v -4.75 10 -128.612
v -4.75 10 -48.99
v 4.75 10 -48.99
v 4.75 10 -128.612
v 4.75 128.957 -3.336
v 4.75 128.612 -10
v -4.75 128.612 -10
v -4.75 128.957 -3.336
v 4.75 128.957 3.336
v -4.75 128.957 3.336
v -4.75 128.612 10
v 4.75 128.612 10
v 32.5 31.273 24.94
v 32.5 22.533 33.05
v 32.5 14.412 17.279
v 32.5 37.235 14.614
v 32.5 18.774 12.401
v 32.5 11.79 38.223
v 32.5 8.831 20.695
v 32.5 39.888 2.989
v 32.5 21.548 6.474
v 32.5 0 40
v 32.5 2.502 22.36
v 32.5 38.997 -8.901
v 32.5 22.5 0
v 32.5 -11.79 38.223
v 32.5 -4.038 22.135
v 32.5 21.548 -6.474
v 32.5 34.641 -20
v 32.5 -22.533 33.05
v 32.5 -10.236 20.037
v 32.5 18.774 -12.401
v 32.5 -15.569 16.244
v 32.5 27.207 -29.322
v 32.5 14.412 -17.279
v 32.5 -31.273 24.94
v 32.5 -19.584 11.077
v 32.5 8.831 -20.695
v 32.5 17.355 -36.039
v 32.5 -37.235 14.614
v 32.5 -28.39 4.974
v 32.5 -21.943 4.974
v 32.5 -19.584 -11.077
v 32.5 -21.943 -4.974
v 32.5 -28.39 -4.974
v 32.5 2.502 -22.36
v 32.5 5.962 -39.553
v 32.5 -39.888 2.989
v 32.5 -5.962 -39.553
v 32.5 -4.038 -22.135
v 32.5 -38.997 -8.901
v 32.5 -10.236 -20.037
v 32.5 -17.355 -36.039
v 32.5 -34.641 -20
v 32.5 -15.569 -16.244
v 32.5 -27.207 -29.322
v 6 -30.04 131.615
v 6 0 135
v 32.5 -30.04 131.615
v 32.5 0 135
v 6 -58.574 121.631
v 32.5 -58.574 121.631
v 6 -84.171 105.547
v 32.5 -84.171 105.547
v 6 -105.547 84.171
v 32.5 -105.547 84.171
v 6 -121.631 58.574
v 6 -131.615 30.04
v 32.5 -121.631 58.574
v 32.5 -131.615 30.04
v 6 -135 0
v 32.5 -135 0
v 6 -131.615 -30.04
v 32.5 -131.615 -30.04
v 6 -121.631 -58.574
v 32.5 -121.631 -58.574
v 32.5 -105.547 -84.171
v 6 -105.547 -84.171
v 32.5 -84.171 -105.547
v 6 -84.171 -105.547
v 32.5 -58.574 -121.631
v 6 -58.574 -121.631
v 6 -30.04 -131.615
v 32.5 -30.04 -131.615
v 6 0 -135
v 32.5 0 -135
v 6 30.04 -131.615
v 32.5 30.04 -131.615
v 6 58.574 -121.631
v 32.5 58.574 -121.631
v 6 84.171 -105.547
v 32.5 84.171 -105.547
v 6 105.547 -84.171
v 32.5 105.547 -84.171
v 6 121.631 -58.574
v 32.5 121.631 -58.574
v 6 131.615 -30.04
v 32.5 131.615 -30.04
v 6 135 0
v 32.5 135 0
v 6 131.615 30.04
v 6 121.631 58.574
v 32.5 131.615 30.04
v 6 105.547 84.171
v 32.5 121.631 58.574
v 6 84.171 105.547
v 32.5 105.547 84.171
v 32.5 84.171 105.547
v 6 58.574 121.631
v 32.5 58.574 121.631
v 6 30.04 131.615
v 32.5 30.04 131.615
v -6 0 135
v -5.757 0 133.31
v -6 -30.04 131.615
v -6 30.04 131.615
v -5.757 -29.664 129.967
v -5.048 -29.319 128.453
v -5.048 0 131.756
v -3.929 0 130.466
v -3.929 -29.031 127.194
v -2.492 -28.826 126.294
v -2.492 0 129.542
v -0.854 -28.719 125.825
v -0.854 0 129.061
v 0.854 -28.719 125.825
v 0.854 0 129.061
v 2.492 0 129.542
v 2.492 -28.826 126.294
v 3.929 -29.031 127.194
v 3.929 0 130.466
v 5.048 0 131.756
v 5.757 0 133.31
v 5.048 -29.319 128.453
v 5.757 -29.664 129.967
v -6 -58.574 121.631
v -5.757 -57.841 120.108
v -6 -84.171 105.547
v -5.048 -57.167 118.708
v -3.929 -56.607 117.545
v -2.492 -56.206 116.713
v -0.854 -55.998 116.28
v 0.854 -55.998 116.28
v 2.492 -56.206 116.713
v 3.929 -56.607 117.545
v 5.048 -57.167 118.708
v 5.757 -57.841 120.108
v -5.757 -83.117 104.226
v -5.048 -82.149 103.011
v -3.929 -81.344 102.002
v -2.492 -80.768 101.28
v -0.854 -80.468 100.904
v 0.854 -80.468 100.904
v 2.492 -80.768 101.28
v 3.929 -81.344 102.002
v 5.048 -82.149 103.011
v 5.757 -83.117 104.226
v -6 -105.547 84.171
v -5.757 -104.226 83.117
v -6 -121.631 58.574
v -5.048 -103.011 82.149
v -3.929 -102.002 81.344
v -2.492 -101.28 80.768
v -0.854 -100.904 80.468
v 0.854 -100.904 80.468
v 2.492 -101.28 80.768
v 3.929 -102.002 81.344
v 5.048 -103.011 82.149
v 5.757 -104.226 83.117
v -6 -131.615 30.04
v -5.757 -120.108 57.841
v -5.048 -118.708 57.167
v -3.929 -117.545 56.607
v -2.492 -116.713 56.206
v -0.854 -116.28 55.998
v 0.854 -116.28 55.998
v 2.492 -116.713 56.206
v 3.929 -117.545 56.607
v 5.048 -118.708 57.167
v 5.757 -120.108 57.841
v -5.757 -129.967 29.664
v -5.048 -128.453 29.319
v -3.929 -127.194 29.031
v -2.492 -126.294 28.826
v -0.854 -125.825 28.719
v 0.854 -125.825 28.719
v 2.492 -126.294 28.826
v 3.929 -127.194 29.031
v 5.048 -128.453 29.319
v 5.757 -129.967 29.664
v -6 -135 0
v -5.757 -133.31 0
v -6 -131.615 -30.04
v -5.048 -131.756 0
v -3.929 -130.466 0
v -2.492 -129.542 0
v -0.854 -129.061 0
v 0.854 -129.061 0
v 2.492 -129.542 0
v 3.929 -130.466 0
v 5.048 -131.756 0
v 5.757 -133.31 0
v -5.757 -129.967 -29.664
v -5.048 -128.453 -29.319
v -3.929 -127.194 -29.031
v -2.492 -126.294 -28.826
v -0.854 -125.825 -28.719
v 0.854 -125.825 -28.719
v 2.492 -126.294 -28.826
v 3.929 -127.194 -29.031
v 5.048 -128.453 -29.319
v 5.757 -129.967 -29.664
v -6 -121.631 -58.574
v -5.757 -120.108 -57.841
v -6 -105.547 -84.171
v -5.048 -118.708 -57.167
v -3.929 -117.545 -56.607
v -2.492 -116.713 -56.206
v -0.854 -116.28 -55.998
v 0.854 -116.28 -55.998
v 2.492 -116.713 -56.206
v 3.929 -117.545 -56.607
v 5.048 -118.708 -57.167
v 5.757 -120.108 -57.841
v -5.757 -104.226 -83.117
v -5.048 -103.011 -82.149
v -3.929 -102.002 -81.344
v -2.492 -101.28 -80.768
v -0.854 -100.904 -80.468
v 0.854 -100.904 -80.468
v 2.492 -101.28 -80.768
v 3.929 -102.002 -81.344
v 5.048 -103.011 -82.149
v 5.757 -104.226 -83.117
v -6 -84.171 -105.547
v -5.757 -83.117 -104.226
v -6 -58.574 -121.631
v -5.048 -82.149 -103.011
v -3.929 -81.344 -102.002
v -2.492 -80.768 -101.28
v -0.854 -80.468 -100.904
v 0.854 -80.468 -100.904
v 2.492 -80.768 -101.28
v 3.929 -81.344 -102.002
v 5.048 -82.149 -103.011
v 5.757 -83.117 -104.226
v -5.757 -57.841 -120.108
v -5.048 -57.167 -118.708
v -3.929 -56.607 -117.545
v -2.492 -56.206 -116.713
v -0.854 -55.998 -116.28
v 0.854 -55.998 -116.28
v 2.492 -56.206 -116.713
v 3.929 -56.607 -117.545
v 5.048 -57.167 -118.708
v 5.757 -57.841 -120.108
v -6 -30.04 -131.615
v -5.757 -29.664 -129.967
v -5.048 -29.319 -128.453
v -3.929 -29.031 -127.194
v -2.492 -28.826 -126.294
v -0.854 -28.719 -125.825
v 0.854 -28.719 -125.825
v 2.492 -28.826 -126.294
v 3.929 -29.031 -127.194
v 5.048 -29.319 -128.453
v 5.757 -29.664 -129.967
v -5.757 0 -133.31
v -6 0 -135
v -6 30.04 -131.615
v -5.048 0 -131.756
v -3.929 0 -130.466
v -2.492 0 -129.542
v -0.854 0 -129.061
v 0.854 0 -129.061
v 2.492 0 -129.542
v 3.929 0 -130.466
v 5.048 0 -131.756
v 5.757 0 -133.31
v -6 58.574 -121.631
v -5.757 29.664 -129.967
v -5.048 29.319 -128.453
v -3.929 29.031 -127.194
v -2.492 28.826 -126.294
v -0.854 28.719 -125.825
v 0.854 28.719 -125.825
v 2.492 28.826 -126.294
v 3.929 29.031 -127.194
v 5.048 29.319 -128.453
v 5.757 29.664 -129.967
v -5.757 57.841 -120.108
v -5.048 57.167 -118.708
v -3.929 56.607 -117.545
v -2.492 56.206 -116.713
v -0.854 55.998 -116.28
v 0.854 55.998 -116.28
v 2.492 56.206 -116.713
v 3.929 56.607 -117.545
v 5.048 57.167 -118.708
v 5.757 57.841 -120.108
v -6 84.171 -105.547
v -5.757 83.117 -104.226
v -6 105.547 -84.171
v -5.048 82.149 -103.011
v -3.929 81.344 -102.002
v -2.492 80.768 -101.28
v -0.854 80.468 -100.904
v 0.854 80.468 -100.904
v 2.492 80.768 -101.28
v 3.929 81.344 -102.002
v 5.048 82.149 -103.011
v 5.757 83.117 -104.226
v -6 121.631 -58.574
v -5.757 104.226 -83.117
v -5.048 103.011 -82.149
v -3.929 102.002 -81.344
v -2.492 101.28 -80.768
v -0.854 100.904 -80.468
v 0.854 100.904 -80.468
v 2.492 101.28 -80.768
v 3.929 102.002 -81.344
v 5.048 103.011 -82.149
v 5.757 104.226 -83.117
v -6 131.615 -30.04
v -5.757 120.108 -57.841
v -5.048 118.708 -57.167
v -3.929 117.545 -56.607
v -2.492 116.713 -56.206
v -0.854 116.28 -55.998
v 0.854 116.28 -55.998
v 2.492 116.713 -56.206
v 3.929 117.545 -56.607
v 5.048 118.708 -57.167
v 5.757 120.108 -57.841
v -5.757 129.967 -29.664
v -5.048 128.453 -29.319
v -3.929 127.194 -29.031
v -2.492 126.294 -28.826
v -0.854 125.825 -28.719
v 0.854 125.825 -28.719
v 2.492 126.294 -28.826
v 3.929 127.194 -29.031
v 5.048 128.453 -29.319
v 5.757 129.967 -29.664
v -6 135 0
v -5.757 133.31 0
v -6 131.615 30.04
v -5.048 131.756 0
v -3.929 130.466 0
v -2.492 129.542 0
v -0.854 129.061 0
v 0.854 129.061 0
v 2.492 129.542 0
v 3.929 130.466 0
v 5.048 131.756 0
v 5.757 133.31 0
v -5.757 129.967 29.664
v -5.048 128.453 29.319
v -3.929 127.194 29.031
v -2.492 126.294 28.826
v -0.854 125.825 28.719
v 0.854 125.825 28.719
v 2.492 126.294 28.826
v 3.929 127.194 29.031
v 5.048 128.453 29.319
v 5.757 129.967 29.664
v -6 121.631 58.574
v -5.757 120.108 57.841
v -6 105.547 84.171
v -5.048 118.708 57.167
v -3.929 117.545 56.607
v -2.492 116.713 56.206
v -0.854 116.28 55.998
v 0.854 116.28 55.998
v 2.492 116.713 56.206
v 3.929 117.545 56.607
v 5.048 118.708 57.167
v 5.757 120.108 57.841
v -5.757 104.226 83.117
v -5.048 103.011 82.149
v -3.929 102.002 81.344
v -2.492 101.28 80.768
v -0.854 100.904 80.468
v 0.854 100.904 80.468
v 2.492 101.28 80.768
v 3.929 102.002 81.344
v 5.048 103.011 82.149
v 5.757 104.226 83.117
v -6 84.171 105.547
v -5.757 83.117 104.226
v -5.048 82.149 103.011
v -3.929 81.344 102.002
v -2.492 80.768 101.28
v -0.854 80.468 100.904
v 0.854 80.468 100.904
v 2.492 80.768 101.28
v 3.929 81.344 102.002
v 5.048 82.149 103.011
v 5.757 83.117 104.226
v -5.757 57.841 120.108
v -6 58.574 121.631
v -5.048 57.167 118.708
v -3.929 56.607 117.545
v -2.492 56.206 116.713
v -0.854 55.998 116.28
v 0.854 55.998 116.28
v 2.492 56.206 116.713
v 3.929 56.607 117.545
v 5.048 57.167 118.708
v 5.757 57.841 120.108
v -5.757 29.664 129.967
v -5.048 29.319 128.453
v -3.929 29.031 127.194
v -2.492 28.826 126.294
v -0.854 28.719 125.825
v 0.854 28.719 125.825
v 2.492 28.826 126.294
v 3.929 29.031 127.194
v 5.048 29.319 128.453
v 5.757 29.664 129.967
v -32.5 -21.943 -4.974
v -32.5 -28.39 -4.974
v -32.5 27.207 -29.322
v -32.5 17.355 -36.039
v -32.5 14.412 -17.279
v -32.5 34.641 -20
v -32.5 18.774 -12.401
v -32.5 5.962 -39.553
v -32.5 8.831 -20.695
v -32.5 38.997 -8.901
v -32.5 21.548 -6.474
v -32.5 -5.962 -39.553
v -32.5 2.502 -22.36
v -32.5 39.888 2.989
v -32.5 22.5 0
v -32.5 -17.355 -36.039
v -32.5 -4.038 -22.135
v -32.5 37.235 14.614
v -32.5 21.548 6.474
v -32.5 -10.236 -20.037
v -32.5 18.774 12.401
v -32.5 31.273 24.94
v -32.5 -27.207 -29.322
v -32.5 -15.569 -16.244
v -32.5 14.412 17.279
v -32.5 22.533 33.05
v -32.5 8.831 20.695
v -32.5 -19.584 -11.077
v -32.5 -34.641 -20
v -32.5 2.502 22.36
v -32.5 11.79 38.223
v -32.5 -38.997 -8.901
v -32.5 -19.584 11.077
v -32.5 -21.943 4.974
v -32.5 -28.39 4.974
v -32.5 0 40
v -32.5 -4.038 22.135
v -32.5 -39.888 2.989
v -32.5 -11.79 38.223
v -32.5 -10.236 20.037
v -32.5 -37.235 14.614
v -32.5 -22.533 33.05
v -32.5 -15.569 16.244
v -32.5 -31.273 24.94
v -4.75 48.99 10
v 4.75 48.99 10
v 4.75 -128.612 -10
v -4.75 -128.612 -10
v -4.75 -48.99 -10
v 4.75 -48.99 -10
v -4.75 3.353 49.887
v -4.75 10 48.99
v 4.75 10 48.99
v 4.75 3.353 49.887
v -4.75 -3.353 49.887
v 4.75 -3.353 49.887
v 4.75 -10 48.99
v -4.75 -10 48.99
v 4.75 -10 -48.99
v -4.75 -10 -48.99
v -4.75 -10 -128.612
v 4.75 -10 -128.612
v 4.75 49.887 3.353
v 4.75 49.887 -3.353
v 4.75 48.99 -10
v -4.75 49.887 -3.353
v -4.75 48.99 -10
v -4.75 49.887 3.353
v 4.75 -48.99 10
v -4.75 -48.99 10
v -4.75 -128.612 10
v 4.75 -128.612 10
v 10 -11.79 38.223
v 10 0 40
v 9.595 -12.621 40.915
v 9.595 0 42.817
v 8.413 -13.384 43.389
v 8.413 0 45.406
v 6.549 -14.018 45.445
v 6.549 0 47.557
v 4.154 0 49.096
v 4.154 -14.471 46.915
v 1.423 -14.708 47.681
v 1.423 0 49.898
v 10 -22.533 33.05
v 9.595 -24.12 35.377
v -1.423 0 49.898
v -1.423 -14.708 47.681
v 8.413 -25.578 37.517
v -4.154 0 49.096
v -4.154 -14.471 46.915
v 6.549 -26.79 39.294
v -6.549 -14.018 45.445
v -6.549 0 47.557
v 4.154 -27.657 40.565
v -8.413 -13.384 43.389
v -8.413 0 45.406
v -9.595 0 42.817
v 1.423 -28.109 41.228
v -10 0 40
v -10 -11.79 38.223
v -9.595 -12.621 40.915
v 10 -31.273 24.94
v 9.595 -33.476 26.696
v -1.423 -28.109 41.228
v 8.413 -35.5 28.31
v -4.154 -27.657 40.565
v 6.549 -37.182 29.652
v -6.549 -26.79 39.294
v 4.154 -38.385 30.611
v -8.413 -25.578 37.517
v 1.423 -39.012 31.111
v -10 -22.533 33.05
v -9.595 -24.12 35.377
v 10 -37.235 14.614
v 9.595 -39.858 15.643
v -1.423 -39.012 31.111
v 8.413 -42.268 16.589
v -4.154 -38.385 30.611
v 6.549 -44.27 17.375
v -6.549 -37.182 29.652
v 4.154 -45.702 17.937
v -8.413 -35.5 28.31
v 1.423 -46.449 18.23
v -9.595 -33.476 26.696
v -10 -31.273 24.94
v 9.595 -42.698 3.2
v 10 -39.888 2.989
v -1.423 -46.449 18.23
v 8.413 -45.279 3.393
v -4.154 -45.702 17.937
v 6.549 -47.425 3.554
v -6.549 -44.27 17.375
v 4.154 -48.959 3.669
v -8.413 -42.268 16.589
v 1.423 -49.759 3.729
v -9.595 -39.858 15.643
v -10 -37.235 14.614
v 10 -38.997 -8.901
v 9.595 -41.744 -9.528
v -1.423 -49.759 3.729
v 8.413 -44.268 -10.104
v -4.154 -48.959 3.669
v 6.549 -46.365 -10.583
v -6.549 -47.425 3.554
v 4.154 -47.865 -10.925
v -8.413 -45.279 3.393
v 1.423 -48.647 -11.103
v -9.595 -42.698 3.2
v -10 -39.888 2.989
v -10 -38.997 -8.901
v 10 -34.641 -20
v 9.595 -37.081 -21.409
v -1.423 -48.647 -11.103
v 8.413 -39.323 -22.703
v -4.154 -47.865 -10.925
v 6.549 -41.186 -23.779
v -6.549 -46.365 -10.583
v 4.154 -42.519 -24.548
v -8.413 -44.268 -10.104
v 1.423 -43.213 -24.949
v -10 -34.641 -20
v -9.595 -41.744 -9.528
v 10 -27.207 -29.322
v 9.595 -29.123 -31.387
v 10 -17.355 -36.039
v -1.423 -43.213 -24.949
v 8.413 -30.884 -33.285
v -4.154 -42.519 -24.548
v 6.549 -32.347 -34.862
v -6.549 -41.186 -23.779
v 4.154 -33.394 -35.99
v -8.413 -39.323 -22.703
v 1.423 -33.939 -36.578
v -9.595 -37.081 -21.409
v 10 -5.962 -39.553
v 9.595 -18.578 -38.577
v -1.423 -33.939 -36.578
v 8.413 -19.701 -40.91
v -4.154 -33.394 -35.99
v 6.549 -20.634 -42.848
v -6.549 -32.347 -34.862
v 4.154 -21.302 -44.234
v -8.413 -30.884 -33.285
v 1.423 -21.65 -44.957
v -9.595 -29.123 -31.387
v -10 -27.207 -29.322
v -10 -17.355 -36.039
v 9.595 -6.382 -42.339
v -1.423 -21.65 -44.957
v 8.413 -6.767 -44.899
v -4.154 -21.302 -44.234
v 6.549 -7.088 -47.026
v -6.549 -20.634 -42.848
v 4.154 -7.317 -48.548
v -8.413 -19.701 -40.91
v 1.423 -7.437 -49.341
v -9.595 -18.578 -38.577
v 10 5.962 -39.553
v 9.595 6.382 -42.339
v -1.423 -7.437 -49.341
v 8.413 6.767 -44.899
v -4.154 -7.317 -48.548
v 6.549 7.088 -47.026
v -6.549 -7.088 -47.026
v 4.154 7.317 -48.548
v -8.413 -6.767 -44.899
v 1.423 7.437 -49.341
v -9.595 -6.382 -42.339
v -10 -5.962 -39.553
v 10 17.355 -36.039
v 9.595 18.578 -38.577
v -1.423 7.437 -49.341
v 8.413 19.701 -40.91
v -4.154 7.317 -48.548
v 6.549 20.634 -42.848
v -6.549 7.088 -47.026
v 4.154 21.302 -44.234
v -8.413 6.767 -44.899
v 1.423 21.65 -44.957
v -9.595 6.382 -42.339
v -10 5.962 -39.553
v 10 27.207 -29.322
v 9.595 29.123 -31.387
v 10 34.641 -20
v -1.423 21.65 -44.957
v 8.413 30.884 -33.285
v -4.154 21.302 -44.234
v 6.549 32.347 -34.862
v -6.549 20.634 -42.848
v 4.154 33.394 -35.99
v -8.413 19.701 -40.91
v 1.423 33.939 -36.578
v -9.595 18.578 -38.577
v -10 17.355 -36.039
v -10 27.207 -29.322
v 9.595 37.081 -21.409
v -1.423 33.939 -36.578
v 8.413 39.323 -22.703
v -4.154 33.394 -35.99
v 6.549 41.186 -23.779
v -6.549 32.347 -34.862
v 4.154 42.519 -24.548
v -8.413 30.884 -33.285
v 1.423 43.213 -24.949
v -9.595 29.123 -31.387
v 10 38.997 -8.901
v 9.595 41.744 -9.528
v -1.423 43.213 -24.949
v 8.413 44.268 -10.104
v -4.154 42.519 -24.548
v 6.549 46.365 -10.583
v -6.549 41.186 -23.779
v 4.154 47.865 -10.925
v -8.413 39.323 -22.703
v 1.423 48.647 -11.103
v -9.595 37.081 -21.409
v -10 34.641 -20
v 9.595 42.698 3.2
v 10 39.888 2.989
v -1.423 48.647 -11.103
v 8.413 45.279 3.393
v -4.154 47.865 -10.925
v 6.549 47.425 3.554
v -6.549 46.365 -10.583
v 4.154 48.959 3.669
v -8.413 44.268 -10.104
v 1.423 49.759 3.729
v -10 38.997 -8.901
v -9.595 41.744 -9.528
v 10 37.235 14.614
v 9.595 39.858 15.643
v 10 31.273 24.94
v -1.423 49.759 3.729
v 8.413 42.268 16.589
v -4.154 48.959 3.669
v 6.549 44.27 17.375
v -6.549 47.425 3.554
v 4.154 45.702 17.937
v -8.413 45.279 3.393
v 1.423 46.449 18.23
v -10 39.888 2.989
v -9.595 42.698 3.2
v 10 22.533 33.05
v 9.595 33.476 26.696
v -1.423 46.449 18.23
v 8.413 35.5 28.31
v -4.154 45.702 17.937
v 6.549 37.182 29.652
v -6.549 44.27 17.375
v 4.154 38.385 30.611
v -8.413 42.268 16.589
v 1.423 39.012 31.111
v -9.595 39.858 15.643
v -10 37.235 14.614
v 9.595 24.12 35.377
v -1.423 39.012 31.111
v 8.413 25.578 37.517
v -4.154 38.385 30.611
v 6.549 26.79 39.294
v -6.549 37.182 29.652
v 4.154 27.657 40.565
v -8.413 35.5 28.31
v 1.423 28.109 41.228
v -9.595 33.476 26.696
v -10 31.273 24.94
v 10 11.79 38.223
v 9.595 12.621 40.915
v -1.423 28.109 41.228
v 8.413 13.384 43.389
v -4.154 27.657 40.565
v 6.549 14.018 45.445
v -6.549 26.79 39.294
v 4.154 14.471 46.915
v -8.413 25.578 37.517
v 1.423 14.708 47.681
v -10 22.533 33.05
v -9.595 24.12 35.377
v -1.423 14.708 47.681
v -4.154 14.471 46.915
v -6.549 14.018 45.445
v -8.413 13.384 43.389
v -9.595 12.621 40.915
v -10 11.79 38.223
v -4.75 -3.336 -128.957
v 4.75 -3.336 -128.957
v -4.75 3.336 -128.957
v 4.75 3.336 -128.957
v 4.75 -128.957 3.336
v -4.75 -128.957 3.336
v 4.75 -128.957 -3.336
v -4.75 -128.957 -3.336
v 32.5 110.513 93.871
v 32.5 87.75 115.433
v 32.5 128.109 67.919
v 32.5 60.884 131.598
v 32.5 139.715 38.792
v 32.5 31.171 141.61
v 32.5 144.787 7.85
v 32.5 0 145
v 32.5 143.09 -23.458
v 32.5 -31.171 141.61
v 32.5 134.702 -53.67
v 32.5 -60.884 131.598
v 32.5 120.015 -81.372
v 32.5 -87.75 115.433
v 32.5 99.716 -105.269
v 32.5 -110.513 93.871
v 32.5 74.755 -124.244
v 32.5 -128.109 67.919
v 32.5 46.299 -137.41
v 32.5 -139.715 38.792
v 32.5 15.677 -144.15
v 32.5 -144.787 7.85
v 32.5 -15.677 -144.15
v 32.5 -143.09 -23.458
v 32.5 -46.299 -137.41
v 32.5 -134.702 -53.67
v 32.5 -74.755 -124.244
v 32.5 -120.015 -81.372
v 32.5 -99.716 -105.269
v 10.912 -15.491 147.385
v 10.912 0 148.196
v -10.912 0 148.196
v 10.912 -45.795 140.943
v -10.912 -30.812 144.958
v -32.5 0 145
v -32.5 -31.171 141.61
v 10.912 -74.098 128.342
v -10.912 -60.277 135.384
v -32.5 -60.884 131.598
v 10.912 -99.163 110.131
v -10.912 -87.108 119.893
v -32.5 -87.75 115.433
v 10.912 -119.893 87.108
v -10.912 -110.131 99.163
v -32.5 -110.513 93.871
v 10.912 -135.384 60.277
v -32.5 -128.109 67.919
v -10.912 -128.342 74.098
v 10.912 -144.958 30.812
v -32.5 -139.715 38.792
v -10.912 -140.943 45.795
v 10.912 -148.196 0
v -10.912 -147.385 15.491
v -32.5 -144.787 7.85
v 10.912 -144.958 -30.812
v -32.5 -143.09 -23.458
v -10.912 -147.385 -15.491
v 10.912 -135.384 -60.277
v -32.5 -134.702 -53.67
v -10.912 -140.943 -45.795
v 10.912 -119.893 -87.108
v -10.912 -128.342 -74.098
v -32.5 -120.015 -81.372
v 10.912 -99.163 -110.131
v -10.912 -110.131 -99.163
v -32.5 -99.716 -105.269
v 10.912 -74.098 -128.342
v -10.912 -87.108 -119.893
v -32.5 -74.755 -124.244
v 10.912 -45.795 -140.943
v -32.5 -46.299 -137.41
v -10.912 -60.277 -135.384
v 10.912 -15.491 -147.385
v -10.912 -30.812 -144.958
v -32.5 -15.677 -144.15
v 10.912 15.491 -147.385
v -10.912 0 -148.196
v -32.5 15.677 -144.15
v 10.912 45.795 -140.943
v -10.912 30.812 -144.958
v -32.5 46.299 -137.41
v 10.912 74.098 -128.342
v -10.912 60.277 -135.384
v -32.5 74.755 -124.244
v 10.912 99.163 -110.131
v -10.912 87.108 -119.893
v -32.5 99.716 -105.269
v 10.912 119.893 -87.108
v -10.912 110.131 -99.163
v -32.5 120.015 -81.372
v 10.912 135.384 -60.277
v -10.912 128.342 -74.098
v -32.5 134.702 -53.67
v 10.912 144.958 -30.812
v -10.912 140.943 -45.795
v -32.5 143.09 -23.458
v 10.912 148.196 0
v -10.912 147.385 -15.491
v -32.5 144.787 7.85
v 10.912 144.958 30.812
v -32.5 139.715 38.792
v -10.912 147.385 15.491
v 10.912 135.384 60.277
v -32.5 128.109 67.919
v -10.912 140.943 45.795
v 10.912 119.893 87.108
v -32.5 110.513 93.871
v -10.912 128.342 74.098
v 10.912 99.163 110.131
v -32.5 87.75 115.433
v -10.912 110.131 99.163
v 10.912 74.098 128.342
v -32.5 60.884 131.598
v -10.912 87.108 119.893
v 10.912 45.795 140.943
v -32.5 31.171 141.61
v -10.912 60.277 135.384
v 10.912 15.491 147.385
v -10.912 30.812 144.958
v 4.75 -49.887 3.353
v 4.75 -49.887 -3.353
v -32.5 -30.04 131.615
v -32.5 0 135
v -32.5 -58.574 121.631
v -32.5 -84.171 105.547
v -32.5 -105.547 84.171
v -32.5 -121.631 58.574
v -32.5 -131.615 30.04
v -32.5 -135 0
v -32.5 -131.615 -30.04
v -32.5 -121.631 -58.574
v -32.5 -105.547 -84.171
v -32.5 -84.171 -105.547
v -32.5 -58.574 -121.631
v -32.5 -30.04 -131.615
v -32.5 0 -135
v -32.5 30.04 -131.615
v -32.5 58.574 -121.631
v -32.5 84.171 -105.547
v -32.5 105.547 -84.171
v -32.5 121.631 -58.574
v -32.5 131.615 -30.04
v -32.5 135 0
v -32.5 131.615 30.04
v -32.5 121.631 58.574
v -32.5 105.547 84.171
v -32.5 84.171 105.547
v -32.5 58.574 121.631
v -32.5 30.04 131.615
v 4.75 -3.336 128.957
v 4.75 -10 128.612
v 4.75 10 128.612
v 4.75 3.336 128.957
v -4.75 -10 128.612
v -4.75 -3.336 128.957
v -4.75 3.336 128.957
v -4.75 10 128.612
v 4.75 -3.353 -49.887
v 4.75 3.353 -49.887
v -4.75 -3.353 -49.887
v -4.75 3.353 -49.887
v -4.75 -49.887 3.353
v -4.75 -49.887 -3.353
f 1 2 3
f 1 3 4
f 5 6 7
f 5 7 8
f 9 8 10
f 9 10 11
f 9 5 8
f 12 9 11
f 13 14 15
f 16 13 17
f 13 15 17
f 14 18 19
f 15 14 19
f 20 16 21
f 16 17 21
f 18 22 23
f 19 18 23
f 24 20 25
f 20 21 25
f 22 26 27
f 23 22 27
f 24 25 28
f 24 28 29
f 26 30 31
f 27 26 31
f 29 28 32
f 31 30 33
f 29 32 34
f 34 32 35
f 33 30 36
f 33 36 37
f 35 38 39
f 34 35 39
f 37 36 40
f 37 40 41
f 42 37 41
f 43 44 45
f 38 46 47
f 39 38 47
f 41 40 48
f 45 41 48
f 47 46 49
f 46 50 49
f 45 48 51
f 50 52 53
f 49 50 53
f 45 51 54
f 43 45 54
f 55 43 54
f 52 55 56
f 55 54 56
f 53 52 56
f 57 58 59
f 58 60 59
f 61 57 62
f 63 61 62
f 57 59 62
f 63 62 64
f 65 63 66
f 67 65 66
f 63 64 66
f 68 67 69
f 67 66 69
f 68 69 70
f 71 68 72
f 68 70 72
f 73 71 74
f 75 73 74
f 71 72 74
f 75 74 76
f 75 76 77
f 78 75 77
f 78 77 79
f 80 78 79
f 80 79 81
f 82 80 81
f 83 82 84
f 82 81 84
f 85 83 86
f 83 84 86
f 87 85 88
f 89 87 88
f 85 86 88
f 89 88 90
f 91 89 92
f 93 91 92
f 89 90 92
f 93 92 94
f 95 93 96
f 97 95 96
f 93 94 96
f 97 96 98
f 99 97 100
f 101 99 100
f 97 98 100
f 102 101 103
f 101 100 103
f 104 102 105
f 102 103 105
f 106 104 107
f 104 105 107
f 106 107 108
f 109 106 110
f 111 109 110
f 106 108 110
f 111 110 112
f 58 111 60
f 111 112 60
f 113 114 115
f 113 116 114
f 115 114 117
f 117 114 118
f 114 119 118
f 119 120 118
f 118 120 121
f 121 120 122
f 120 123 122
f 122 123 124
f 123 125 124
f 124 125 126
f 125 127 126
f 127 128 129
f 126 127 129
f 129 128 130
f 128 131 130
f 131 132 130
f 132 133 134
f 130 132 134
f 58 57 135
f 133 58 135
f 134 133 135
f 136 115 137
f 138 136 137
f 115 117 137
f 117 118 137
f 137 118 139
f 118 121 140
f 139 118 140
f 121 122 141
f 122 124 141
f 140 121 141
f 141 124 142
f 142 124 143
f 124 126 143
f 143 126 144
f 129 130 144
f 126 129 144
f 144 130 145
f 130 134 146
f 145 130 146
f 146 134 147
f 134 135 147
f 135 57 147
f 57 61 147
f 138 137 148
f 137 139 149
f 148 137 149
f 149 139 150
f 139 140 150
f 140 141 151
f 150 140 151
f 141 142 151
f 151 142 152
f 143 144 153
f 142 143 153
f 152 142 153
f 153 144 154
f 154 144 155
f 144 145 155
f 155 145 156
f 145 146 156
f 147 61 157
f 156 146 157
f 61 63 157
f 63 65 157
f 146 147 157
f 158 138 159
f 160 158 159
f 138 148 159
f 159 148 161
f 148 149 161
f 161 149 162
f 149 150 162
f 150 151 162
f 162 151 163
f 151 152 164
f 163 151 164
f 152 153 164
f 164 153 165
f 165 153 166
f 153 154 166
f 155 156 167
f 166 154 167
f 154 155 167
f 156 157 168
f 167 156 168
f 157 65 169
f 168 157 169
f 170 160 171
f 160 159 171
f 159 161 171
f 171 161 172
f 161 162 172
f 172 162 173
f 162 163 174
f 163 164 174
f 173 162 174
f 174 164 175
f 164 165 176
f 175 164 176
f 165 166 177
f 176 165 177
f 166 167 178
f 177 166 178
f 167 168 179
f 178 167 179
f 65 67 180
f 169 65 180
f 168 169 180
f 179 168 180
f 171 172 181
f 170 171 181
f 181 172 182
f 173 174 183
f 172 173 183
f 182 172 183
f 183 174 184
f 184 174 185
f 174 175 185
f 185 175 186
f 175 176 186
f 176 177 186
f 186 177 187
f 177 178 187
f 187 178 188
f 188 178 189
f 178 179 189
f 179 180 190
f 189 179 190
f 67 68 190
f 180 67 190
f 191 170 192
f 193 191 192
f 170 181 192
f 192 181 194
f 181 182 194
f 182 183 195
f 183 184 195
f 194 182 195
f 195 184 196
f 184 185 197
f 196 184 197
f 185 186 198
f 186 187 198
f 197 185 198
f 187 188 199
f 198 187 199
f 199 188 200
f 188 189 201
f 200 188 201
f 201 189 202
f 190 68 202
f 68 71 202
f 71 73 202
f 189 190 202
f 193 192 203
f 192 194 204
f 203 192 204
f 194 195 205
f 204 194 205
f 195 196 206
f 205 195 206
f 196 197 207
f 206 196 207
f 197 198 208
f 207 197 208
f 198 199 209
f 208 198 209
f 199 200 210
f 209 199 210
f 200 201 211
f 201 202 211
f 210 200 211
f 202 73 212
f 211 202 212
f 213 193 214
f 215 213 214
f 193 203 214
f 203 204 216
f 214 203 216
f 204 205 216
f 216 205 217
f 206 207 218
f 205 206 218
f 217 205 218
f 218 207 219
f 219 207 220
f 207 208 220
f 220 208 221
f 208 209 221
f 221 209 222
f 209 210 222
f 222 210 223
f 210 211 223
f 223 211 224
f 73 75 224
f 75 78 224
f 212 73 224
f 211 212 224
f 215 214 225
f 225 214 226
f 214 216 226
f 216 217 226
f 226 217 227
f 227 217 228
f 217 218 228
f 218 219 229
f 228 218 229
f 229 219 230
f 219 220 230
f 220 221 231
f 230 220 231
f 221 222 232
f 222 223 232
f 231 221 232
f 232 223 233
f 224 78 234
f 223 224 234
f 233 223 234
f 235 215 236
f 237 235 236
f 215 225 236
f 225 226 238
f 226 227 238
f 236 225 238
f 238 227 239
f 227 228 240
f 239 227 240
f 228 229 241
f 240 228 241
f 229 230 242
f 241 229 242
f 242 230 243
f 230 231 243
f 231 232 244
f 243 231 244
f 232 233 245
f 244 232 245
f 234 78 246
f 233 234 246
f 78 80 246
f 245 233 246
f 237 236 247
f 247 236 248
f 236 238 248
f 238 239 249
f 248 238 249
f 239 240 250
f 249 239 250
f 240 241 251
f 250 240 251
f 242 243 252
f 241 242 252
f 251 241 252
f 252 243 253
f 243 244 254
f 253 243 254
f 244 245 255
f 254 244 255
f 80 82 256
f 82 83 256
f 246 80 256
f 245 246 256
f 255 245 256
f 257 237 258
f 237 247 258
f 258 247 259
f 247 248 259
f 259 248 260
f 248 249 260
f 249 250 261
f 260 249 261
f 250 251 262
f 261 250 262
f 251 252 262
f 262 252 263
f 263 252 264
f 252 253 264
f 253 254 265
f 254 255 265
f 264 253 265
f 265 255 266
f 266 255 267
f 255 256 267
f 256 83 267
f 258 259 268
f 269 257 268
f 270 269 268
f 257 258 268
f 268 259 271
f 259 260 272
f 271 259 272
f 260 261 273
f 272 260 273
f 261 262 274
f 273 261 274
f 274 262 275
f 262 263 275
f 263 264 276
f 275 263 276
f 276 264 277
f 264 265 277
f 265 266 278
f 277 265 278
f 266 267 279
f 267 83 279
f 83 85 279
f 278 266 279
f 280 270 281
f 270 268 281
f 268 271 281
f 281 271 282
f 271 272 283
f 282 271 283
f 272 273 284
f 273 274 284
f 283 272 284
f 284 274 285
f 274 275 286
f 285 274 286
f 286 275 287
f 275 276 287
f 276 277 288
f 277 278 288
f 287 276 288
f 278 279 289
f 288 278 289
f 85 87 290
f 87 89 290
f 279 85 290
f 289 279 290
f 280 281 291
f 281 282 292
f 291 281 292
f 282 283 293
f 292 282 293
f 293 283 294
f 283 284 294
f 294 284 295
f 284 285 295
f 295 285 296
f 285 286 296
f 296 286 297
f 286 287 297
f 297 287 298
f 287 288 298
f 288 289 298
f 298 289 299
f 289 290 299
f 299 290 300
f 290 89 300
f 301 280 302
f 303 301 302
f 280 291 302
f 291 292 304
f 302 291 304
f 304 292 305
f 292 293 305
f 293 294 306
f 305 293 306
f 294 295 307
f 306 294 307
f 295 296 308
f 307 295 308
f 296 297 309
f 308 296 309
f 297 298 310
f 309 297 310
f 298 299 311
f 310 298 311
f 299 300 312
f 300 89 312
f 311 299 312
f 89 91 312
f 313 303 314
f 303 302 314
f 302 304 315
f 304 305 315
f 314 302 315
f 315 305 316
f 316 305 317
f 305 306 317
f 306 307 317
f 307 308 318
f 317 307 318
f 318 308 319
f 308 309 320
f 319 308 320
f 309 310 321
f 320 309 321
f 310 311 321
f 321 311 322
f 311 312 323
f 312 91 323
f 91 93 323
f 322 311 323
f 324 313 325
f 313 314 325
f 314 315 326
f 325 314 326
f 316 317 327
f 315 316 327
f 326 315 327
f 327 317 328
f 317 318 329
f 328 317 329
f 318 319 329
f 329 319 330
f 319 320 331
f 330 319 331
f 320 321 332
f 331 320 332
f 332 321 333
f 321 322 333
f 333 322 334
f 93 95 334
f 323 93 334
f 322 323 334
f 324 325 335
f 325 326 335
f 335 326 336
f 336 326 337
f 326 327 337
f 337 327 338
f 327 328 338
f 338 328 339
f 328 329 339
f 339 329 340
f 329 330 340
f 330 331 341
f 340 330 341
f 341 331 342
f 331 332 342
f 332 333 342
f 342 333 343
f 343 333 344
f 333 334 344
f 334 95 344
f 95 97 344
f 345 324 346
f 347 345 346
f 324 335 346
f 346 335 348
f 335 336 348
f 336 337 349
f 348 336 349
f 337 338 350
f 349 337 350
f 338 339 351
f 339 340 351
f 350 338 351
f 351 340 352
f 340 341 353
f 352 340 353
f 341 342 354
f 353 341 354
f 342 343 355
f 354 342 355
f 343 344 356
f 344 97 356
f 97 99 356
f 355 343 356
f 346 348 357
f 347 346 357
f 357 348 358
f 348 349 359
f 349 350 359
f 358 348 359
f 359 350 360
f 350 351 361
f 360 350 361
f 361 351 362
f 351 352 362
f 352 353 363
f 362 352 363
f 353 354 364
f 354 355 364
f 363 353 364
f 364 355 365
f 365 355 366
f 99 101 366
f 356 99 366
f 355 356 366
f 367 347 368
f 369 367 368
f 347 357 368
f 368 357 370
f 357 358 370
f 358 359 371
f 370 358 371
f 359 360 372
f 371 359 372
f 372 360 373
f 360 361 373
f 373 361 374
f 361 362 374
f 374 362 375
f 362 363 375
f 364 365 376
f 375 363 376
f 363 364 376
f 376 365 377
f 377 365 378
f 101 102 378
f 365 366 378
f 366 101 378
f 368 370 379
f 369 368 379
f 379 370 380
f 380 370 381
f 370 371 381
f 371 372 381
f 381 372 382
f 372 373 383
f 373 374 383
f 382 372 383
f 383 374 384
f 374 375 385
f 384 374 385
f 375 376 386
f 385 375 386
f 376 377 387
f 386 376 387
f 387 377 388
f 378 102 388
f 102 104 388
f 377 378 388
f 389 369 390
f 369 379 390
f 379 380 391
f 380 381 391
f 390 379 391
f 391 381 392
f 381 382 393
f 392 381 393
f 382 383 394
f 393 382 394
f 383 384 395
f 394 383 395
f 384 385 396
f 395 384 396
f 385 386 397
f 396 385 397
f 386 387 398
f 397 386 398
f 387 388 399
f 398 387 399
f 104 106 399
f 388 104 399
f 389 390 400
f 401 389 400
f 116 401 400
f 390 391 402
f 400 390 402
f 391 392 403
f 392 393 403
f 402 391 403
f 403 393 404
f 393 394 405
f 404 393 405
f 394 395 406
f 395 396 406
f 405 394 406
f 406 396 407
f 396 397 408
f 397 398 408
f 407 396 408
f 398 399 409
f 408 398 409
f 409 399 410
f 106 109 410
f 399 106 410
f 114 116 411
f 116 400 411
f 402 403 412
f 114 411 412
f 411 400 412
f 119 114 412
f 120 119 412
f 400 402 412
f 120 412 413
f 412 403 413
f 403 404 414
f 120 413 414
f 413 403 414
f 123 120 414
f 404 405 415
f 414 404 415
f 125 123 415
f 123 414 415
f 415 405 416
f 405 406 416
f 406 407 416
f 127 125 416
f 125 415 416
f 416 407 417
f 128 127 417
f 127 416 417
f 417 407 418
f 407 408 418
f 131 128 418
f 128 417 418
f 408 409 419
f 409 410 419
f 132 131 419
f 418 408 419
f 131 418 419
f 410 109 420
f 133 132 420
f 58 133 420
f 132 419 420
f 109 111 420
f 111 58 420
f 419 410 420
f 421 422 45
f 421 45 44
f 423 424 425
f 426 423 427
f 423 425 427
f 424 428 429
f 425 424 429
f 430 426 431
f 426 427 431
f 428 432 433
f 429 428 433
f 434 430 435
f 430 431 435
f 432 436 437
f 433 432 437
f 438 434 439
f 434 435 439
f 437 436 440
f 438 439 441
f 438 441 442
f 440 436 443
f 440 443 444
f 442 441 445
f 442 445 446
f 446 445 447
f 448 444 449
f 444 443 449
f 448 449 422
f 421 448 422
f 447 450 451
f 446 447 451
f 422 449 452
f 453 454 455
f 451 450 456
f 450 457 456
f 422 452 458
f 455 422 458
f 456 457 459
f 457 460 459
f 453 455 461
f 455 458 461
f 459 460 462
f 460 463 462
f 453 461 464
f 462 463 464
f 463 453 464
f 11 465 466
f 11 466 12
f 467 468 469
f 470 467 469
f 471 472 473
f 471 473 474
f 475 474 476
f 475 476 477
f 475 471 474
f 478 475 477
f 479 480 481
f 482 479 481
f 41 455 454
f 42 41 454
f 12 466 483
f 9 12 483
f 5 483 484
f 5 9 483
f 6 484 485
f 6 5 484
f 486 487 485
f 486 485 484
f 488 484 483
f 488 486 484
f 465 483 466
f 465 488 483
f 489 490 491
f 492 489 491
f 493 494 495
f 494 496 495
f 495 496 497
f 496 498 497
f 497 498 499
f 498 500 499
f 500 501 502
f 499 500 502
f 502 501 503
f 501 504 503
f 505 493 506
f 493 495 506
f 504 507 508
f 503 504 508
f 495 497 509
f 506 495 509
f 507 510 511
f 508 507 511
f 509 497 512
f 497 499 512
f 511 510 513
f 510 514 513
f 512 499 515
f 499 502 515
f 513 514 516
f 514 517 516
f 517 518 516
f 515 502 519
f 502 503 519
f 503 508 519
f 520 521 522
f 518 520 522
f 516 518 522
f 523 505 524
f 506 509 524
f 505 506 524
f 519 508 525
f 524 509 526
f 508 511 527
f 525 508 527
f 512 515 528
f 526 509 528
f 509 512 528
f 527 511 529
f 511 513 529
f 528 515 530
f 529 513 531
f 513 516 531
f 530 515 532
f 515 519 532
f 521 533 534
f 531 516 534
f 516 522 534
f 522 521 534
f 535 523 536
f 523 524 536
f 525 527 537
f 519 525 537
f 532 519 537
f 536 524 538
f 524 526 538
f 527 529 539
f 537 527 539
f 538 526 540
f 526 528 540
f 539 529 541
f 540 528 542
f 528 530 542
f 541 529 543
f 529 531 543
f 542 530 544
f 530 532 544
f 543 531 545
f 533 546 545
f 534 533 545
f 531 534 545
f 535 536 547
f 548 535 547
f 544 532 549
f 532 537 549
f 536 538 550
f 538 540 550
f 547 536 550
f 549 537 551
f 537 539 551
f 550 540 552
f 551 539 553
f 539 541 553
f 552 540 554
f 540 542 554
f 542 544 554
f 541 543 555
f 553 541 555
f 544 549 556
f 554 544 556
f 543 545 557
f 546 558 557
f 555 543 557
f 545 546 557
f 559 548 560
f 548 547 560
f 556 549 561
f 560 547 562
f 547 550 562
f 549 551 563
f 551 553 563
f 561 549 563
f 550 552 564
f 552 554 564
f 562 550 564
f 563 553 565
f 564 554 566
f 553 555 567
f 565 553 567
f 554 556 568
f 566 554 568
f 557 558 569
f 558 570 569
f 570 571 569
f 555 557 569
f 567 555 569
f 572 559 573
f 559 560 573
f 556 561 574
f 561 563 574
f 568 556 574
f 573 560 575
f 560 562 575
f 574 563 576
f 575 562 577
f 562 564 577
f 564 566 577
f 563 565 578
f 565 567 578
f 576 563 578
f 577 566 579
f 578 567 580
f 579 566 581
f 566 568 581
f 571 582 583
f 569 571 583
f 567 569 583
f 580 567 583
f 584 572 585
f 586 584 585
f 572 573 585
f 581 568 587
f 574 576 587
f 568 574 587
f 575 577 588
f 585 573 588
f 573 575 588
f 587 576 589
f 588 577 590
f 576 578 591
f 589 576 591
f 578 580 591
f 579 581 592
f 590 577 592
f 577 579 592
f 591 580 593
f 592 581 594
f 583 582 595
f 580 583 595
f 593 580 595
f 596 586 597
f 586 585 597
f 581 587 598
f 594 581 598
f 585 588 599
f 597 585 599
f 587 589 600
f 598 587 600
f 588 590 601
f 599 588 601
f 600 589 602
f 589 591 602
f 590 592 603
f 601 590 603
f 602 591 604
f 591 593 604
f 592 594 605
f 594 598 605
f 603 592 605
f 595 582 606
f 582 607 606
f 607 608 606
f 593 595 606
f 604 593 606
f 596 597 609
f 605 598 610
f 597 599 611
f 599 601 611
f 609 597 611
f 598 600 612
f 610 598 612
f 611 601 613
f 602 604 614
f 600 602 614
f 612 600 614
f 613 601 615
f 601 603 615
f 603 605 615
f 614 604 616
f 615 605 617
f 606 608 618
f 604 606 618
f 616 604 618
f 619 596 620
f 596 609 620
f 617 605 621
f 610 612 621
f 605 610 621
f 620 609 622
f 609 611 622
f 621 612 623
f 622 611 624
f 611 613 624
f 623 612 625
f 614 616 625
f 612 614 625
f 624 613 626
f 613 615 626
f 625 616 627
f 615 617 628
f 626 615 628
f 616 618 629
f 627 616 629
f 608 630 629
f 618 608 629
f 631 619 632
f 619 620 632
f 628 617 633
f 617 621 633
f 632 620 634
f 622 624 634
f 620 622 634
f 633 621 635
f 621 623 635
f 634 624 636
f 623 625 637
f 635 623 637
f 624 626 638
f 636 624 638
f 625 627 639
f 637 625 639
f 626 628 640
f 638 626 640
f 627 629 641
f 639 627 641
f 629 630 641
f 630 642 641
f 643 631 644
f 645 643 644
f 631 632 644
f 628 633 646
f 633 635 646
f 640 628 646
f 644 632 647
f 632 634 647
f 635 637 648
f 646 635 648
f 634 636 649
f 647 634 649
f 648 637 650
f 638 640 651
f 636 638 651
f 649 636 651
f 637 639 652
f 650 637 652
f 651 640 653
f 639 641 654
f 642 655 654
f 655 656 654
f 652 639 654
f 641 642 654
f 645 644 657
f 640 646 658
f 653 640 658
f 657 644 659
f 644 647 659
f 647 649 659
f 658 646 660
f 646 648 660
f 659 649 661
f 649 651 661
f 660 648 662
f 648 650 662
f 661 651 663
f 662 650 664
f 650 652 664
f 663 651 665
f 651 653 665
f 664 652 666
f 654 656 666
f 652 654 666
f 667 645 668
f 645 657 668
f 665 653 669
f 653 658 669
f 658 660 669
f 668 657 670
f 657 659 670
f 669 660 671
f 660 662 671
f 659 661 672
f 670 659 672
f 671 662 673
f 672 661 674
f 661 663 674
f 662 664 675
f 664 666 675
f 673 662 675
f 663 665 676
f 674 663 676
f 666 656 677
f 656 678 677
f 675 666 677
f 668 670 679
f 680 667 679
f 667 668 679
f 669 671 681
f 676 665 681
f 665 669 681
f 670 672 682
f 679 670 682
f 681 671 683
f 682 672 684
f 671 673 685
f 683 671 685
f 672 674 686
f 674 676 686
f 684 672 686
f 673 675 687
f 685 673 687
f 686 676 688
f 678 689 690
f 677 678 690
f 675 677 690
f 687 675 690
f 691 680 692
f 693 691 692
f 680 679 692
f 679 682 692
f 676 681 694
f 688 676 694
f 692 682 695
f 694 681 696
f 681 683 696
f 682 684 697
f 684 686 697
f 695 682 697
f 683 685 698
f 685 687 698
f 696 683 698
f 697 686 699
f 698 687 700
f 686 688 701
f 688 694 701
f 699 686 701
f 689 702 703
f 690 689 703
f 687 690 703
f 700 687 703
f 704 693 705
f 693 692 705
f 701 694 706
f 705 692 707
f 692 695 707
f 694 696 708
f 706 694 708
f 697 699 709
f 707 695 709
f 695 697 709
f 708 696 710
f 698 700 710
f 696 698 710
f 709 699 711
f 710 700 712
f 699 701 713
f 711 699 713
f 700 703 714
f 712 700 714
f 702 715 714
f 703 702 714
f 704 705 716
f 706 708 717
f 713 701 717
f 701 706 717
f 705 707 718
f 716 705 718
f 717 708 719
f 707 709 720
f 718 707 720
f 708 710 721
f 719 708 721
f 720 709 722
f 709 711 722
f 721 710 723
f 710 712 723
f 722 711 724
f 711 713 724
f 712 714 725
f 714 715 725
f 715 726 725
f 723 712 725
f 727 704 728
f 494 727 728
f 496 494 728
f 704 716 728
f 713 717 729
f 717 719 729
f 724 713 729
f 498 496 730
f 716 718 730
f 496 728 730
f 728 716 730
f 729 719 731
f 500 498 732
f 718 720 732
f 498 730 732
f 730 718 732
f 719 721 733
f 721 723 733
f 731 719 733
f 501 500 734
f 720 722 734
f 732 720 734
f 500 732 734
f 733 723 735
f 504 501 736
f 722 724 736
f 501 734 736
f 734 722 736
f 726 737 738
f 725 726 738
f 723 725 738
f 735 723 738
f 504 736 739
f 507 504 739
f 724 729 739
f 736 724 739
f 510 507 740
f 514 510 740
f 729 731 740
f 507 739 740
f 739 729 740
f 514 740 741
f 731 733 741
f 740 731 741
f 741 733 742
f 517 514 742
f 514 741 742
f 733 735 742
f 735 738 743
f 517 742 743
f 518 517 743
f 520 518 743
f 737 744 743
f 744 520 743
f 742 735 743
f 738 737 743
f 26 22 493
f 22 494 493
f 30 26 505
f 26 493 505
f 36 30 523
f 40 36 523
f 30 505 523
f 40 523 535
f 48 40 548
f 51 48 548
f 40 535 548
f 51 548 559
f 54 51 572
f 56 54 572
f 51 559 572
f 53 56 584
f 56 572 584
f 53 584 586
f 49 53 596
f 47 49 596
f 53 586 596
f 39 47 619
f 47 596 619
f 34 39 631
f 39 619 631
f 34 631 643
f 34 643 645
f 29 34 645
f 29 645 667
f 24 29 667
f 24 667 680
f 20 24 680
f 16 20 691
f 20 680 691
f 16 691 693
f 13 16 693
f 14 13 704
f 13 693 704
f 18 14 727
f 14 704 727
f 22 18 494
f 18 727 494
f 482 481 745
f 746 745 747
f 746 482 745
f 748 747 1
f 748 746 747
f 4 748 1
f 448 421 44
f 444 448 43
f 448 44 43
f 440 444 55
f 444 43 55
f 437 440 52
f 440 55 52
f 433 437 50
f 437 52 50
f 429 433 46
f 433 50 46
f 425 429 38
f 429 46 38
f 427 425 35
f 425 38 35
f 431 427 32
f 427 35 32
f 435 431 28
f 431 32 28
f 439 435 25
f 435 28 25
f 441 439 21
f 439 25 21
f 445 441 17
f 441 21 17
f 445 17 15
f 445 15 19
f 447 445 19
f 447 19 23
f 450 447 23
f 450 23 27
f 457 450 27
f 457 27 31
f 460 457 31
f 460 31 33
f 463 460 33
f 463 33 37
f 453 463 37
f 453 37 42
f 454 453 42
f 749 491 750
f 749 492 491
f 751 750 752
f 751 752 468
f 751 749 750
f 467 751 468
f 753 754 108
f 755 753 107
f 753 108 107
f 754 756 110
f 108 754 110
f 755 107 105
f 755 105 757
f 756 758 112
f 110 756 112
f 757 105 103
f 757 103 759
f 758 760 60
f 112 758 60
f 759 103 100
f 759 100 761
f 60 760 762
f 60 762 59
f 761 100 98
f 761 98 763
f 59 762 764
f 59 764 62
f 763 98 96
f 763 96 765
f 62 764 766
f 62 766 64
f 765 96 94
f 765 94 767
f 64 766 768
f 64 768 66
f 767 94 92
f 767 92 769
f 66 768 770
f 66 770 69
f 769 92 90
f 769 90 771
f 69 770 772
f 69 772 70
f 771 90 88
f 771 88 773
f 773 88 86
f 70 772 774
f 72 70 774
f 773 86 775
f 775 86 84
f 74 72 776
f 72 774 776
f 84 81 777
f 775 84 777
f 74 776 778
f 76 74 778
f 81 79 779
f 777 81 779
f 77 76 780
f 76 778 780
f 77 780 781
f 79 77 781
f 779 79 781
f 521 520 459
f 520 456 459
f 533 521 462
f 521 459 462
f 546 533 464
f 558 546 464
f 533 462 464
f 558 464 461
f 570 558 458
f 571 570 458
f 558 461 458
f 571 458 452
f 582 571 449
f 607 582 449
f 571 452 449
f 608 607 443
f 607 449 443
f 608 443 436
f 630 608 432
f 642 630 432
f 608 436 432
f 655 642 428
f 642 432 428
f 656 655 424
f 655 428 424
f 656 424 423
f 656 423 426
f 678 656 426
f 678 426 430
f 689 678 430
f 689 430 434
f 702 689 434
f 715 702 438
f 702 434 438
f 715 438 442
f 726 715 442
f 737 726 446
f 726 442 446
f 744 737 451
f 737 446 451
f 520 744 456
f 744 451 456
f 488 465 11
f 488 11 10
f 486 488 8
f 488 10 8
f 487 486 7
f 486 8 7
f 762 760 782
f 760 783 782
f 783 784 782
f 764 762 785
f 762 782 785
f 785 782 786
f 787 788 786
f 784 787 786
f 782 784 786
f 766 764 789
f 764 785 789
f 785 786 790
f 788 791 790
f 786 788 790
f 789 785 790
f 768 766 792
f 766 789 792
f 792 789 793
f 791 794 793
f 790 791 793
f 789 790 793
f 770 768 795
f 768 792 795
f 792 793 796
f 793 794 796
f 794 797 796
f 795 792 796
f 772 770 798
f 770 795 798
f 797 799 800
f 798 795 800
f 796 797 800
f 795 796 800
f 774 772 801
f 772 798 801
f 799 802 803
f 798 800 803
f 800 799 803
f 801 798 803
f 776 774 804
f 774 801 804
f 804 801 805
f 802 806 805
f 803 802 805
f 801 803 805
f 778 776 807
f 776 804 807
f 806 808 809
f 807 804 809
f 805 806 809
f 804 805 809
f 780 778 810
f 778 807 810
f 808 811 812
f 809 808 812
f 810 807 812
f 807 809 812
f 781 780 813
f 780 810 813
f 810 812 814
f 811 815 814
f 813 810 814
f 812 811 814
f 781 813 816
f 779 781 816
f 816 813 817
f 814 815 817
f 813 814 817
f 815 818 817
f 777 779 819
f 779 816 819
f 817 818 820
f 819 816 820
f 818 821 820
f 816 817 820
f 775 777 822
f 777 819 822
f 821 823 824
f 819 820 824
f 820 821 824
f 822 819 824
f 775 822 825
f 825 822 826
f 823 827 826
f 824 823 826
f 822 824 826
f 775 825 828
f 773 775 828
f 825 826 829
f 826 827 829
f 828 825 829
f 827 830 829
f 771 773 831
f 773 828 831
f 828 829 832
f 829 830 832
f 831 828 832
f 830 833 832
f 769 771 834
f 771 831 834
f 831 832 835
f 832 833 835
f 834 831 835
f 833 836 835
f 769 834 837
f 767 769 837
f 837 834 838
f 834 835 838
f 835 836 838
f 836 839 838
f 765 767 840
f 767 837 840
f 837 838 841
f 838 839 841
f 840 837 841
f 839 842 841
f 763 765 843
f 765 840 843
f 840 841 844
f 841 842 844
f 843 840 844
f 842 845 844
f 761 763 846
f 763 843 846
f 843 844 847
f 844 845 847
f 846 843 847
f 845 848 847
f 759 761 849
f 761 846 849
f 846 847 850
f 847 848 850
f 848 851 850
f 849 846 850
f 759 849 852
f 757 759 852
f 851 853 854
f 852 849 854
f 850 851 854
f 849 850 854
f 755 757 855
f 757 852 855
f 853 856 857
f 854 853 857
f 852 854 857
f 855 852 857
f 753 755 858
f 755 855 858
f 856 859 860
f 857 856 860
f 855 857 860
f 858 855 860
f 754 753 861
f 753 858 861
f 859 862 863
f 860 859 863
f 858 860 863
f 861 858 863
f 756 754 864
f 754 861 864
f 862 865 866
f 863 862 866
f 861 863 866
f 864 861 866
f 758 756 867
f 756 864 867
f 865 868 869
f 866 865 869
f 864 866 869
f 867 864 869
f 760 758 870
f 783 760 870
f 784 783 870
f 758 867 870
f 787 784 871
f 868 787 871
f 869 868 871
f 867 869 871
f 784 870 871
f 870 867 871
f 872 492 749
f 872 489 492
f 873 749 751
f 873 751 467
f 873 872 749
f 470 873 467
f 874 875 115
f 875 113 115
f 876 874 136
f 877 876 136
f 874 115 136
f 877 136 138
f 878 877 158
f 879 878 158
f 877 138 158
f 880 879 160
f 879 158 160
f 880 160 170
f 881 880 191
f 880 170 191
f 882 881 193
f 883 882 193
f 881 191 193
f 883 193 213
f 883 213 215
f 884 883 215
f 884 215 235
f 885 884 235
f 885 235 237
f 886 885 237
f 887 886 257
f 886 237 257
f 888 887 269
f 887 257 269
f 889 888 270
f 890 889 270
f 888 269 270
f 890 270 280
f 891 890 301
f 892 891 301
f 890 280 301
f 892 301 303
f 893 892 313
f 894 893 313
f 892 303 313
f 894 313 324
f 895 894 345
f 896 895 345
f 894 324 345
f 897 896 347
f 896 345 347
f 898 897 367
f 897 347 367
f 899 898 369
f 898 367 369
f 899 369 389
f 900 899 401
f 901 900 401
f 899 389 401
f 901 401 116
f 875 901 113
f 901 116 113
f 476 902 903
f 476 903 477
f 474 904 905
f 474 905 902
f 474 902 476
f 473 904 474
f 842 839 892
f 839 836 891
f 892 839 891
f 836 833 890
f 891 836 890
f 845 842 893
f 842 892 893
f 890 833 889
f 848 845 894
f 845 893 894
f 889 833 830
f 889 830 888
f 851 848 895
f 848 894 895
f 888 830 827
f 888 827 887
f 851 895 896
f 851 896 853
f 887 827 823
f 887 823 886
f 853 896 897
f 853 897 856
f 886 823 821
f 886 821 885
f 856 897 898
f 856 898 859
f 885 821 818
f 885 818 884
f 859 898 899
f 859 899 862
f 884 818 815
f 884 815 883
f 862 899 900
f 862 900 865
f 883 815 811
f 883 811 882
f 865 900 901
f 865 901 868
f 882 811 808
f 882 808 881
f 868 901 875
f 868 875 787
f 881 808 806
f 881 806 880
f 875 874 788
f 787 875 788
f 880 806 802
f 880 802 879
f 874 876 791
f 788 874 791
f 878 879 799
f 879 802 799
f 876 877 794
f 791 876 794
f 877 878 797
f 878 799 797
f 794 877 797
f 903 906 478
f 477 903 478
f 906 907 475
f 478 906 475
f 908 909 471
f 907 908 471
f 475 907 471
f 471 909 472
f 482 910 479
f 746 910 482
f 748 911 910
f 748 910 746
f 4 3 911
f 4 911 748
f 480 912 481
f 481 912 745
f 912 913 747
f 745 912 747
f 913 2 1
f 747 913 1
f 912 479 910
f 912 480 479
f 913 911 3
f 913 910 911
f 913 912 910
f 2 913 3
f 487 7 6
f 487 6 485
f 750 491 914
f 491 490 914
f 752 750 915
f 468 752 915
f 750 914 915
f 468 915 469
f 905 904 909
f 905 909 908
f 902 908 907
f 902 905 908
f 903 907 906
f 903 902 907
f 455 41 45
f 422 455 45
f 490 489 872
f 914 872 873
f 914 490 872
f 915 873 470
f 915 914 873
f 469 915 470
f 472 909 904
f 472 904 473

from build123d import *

# Parameters (mm, degrees)
SKETCH2_R               = 129
SKETCH2_R_2             = 50
BOSS_EXTRUDE1_DEPTH     = 4.75
CUT_EXTRUDE5_DEPTH      = 160
CUT_EXTRUDE5_DEPTH_BACK = 138
SKETCH6_R               = 22.5
CUT_EXTRUDE6_DEPTH      = 138
SKETCH7_W               = 9.947014286
SKETCH7_H               = 11.780873212
CUT_EXTRUDE7_DEPTH      = 138


with BuildPart() as part:
    # Sketch1 → Revolve1 (revolve)
    with BuildSketch(Plane.XY, mode=Mode.PRIVATE) as revolve1_sk:
        with BuildLine():
            Line((-32.5, 10), (32.5, 10))
            Line((32.5, 10), (32.5, 40))
            Line((32.5, 40), (10, 40))
            ThreePointArc((10, 40), (0, 50), (-10, 40))
            Line((-10, 40), (-32.5, 40))
            Line((-32.5, 40), (-32.5, 10))
        make_face()
        with BuildLine():
            Line((-32.5, 135), (-6, 135))
            ThreePointArc((-6, 135), (0, 129), (6, 135))
            Line((6, 135), (32.5, 135))
            Line((32.5, 135), (32.5, 145))
            ThreePointArc((32.5, 145), (0, 148.597611017), (-32.5, 145))
            Line((-32.5, 145), (-32.5, 135))
        make_face()
    revolve(revolve1_sk.sketch.rotate(Axis((-46.335135684, 0, 0), (1, 0, 0)), 90), axis=Axis((-46.335135684, 0, 0), (1, 0, 0)))

    # Sketch6 → Cut-Extrude6 (cut)
    with BuildSketch(Plane(origin=(32.5, 0, 0), x_dir=(0, 0, -1), z_dir=(1, 0, 0))):
        Circle(SKETCH6_R)
    extrude(amount=-CUT_EXTRUDE6_DEPTH, mode=Mode.SUBTRACT)

    # Sketch7 → Cut-Extrude7 (cut)
    with BuildSketch(Plane(origin=(32.5, 0, 0), x_dir=(0, 0, -1), z_dir=(1, 0, 0))):
        with Locations((0, -22.5)):
            Rectangle(SKETCH7_W, SKETCH7_H)
    extrude(amount=-CUT_EXTRUDE7_DEPTH, mode=Mode.SUBTRACT)


with BuildPart() as body_2:
    # Sketch2 → Boss-Extrude1 (new, symmetric)
    with BuildSketch(Plane(origin=(0, 0, 0), x_dir=(0, 0, -1), z_dir=(1, 0, 0))):
        Circle(SKETCH2_R)
        Circle(SKETCH2_R_2, mode=Mode.SUBTRACT)
    extrude(amount=BOSS_EXTRUDE1_DEPTH, both=True)

    # Sketch3 → Cut-Extrude5 (cut, two sides: drawn at the far end of the back side and taken through both)
    with BuildSketch(Plane(origin=(4.75, 0, 0), x_dir=(0, 0, -1), z_dir=(1, 0, 0)).offset(-CUT_EXTRUDE5_DEPTH_BACK)):
        with BuildLine():
            Line((48.989794856, 10), (128.611819053, 10))
            ThreePointArc((128.611819053, 10), (91.216774773, 91.216774773), (10, 128.611819053))
            Line((10, 128.611819053), (10, 48.989794856))
            ThreePointArc((10, 48.989794856), (35.355339059, 35.355339059), (48.989794856, 10))
        make_face()
        with BuildLine():
            Line((-10, 48.989794856), (-10, 128.611819053))
            ThreePointArc((-10, 128.611819053), (-91.216774773, 91.216774773), (-128.611819053, 10))
            Line((-128.611819053, 10), (-48.989794856, 10))
            ThreePointArc((-48.989794856, 10), (-35.355339059, 35.355339059), (-10, 48.989794856))
        make_face()
        with BuildLine():
            Line((48.989794856, -10), (128.611819053, -10))
            ThreePointArc((128.611819053, -10), (91.216774773, -91.216774773), (10, -128.611819053))
            Line((10, -128.611819053), (10, -48.989794856))
            ThreePointArc((10, -48.989794856), (35.355339059, -35.355339059), (48.989794856, -10))
        make_face()
        with BuildLine():
            Line((-10, -48.989794856), (-10, -128.611819053))
            ThreePointArc((-10, -128.611819053), (-91.216774773, -91.216774773), (-128.611819053, -10))
            Line((-128.611819053, -10), (-48.989794856, -10))
            ThreePointArc((-48.989794856, -10), (-35.355339059, -35.355339059), (-10, -48.989794856))
        make_face()
    extrude(amount=CUT_EXTRUDE5_DEPTH + CUT_EXTRUDE5_DEPTH_BACK, mode=Mode.SUBTRACT)


with BuildPart() as cut_extrude5_piece_1:
    # of the separate pieces the step leaves, piece 1, a body of its own (cut_extrude5_pieces)
    add(body_2.part.solids().sort_by_distance((4.75, 10, -128.611819053))[0])


with BuildPart() as cut_extrude5_piece_2:
    # of the separate pieces the step leaves, piece 2, a body of its own (cut_extrude5_pieces)
    add(body_2.part.solids().sort_by_distance((4.75, 128.611819053, -10))[0])


with BuildPart() as cut_extrude5_piece_3:
    # of the separate pieces the step leaves, piece 3, a body of its own (cut_extrude5_pieces)
    add(body_2.part.solids().sort_by_distance((-4.75, -128.611819053, 10))[0])


with BuildPart() as cut_extrude5_piece_4:
    # of the separate pieces the step leaves, piece 4, a body of its own (cut_extrude5_pieces)
    add(body_2.part.solids().sort_by_distance((4.75, 10, 128.611819053))[0])


solid = Compound([part.part, cut_extrude5_piece_1.part, cut_extrude5_piece_2.part, cut_extrude5_piece_3.part, cut_extrude5_piece_4.part])
